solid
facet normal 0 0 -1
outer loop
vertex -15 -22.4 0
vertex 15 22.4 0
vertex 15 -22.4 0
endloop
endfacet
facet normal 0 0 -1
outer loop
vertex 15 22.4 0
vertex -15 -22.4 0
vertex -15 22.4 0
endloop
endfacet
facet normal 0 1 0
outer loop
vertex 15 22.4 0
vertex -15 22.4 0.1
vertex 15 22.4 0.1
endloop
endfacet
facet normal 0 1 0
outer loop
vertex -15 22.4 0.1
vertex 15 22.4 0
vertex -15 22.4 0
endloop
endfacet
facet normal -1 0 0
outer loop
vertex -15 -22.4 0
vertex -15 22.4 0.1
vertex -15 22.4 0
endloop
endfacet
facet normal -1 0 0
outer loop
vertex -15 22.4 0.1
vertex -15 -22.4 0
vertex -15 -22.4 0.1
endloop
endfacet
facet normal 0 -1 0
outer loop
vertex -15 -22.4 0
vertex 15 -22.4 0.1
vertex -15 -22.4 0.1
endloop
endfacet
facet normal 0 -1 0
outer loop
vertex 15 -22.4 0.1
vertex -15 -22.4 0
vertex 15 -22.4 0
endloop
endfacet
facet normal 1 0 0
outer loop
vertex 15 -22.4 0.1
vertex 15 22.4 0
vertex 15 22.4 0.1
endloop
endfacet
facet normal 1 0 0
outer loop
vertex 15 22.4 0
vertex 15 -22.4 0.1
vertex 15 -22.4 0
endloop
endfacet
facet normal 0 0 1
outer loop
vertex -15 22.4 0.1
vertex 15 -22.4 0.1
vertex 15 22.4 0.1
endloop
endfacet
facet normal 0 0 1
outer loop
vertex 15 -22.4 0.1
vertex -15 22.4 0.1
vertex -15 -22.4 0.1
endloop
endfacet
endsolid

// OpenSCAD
// file: ../p/box5-12.scad
use <../lib.scad>
function ldraw_lib__box5_12() = [
// 0 Box with 5 Faces without Any Edges
// 0 Name: box5-12.dat
// 0 Author: Chris Dee [cwdee]
// 0 !LDRAW_ORG Primitive UPDATE 2009-02
// 0 !LICENSE Licensed under CC BY 4.0 : see CAreadme.txt
// 
// 0 BFC CERTIFY CCW
  [0,"BFC","CERTIFY"],
  [0,"BFC","CCW"],
// 
// 0 !HISTORY 2009-09-03 [PTadmin] Official Update 2009-02
// 
// 
// 4 16 1 1 1 1 1 -1 -1 1 -1 -1 1 1
  [4,16,1,1,1,1,1,-1,-1,1,-1,-1,1,1],
// 4 16 -1 0 1 1 0 1 1 1 1 -1 1 1
  [4,16,-1,0,1,1,0,1,1,1,1,-1,1,1],
// 4 16 -1 0 -1 -1 0 1 -1 1 1 -1 1 -1
  [4,16,-1,0,-1,-1,0,1,-1,1,1,-1,1,-1],
// 4 16 1 0 -1 -1 0 -1 -1 1 -1 1 1 -1
  [4,16,1,0,-1,-1,0,-1,-1,1,-1,1,1,-1],
// 4 16 1 0 1 1 0 -1 1 1 -1 1 1 1
  [4,16,1,0,1,1,0,-1,1,1,-1,1,1,1],
// 0
];
module ldraw_lib__box5_12(step=0, col=false, unit=2/5, alt=false, line=0.2, solid=!$preview)
    makepoly(ldraw_lib__box5_12(), step=step, col=col, unit=unit, alt=alt, line=line, solid=solid);
ldraw_lib__box5_12(line=0.2);
// main file
use <../lib.scad>
use <../p/box5-12.scad>
function ldraw_lib__6342869b() = [
// 0 Sticker  5.6 x  3.8 Chrome
// 0 Name: 6342869b.dat
// 0 Author: Orion Pobursky [OrionP]
// 0 !LDRAW_ORG Part UPDATE 2024-04
// 0 !LICENSE Licensed under CC BY 4.0 : see CAreadme.txt
// 
// 0 BFC CERTIFY CCW
  [0,"BFC","CERTIFY"],
  [0,"BFC","CCW"],
// 
// 0 !KEYWORDS Discovery, Set 10283
// 
// 0 !HISTORY 2024-05-28 [OrionP] Official Update 2024-04
// 
// 
// 1 16 0 -0.25 0 37.5 0 0 0 .25 0 0 0 56 box5-12.dat
  [1,16,0,-0.25,0,37.5,0,0,0,.25,0,0,0,56, ldraw_lib__box5_12()],
// 4 383 37.5 -0.25 56 -37.5 -0.25 56 -37.5 -0.25 -56 37.5 -0.25 -56
  [4,383,37.5,-0.25,56,-37.5,-0.25,56,-37.5,-0.25,-56,37.5,-0.25,-56],
];
module ldraw_lib__6342869b(step=0, col=false, unit=2/5, alt=false, line=0.2, solid=!$preview)
    makepoly(ldraw_lib__6342869b(), step=step, col=col, unit=unit, alt=alt, line=line, solid=solid);
ldraw_lib__6342869b(line=0.2);
